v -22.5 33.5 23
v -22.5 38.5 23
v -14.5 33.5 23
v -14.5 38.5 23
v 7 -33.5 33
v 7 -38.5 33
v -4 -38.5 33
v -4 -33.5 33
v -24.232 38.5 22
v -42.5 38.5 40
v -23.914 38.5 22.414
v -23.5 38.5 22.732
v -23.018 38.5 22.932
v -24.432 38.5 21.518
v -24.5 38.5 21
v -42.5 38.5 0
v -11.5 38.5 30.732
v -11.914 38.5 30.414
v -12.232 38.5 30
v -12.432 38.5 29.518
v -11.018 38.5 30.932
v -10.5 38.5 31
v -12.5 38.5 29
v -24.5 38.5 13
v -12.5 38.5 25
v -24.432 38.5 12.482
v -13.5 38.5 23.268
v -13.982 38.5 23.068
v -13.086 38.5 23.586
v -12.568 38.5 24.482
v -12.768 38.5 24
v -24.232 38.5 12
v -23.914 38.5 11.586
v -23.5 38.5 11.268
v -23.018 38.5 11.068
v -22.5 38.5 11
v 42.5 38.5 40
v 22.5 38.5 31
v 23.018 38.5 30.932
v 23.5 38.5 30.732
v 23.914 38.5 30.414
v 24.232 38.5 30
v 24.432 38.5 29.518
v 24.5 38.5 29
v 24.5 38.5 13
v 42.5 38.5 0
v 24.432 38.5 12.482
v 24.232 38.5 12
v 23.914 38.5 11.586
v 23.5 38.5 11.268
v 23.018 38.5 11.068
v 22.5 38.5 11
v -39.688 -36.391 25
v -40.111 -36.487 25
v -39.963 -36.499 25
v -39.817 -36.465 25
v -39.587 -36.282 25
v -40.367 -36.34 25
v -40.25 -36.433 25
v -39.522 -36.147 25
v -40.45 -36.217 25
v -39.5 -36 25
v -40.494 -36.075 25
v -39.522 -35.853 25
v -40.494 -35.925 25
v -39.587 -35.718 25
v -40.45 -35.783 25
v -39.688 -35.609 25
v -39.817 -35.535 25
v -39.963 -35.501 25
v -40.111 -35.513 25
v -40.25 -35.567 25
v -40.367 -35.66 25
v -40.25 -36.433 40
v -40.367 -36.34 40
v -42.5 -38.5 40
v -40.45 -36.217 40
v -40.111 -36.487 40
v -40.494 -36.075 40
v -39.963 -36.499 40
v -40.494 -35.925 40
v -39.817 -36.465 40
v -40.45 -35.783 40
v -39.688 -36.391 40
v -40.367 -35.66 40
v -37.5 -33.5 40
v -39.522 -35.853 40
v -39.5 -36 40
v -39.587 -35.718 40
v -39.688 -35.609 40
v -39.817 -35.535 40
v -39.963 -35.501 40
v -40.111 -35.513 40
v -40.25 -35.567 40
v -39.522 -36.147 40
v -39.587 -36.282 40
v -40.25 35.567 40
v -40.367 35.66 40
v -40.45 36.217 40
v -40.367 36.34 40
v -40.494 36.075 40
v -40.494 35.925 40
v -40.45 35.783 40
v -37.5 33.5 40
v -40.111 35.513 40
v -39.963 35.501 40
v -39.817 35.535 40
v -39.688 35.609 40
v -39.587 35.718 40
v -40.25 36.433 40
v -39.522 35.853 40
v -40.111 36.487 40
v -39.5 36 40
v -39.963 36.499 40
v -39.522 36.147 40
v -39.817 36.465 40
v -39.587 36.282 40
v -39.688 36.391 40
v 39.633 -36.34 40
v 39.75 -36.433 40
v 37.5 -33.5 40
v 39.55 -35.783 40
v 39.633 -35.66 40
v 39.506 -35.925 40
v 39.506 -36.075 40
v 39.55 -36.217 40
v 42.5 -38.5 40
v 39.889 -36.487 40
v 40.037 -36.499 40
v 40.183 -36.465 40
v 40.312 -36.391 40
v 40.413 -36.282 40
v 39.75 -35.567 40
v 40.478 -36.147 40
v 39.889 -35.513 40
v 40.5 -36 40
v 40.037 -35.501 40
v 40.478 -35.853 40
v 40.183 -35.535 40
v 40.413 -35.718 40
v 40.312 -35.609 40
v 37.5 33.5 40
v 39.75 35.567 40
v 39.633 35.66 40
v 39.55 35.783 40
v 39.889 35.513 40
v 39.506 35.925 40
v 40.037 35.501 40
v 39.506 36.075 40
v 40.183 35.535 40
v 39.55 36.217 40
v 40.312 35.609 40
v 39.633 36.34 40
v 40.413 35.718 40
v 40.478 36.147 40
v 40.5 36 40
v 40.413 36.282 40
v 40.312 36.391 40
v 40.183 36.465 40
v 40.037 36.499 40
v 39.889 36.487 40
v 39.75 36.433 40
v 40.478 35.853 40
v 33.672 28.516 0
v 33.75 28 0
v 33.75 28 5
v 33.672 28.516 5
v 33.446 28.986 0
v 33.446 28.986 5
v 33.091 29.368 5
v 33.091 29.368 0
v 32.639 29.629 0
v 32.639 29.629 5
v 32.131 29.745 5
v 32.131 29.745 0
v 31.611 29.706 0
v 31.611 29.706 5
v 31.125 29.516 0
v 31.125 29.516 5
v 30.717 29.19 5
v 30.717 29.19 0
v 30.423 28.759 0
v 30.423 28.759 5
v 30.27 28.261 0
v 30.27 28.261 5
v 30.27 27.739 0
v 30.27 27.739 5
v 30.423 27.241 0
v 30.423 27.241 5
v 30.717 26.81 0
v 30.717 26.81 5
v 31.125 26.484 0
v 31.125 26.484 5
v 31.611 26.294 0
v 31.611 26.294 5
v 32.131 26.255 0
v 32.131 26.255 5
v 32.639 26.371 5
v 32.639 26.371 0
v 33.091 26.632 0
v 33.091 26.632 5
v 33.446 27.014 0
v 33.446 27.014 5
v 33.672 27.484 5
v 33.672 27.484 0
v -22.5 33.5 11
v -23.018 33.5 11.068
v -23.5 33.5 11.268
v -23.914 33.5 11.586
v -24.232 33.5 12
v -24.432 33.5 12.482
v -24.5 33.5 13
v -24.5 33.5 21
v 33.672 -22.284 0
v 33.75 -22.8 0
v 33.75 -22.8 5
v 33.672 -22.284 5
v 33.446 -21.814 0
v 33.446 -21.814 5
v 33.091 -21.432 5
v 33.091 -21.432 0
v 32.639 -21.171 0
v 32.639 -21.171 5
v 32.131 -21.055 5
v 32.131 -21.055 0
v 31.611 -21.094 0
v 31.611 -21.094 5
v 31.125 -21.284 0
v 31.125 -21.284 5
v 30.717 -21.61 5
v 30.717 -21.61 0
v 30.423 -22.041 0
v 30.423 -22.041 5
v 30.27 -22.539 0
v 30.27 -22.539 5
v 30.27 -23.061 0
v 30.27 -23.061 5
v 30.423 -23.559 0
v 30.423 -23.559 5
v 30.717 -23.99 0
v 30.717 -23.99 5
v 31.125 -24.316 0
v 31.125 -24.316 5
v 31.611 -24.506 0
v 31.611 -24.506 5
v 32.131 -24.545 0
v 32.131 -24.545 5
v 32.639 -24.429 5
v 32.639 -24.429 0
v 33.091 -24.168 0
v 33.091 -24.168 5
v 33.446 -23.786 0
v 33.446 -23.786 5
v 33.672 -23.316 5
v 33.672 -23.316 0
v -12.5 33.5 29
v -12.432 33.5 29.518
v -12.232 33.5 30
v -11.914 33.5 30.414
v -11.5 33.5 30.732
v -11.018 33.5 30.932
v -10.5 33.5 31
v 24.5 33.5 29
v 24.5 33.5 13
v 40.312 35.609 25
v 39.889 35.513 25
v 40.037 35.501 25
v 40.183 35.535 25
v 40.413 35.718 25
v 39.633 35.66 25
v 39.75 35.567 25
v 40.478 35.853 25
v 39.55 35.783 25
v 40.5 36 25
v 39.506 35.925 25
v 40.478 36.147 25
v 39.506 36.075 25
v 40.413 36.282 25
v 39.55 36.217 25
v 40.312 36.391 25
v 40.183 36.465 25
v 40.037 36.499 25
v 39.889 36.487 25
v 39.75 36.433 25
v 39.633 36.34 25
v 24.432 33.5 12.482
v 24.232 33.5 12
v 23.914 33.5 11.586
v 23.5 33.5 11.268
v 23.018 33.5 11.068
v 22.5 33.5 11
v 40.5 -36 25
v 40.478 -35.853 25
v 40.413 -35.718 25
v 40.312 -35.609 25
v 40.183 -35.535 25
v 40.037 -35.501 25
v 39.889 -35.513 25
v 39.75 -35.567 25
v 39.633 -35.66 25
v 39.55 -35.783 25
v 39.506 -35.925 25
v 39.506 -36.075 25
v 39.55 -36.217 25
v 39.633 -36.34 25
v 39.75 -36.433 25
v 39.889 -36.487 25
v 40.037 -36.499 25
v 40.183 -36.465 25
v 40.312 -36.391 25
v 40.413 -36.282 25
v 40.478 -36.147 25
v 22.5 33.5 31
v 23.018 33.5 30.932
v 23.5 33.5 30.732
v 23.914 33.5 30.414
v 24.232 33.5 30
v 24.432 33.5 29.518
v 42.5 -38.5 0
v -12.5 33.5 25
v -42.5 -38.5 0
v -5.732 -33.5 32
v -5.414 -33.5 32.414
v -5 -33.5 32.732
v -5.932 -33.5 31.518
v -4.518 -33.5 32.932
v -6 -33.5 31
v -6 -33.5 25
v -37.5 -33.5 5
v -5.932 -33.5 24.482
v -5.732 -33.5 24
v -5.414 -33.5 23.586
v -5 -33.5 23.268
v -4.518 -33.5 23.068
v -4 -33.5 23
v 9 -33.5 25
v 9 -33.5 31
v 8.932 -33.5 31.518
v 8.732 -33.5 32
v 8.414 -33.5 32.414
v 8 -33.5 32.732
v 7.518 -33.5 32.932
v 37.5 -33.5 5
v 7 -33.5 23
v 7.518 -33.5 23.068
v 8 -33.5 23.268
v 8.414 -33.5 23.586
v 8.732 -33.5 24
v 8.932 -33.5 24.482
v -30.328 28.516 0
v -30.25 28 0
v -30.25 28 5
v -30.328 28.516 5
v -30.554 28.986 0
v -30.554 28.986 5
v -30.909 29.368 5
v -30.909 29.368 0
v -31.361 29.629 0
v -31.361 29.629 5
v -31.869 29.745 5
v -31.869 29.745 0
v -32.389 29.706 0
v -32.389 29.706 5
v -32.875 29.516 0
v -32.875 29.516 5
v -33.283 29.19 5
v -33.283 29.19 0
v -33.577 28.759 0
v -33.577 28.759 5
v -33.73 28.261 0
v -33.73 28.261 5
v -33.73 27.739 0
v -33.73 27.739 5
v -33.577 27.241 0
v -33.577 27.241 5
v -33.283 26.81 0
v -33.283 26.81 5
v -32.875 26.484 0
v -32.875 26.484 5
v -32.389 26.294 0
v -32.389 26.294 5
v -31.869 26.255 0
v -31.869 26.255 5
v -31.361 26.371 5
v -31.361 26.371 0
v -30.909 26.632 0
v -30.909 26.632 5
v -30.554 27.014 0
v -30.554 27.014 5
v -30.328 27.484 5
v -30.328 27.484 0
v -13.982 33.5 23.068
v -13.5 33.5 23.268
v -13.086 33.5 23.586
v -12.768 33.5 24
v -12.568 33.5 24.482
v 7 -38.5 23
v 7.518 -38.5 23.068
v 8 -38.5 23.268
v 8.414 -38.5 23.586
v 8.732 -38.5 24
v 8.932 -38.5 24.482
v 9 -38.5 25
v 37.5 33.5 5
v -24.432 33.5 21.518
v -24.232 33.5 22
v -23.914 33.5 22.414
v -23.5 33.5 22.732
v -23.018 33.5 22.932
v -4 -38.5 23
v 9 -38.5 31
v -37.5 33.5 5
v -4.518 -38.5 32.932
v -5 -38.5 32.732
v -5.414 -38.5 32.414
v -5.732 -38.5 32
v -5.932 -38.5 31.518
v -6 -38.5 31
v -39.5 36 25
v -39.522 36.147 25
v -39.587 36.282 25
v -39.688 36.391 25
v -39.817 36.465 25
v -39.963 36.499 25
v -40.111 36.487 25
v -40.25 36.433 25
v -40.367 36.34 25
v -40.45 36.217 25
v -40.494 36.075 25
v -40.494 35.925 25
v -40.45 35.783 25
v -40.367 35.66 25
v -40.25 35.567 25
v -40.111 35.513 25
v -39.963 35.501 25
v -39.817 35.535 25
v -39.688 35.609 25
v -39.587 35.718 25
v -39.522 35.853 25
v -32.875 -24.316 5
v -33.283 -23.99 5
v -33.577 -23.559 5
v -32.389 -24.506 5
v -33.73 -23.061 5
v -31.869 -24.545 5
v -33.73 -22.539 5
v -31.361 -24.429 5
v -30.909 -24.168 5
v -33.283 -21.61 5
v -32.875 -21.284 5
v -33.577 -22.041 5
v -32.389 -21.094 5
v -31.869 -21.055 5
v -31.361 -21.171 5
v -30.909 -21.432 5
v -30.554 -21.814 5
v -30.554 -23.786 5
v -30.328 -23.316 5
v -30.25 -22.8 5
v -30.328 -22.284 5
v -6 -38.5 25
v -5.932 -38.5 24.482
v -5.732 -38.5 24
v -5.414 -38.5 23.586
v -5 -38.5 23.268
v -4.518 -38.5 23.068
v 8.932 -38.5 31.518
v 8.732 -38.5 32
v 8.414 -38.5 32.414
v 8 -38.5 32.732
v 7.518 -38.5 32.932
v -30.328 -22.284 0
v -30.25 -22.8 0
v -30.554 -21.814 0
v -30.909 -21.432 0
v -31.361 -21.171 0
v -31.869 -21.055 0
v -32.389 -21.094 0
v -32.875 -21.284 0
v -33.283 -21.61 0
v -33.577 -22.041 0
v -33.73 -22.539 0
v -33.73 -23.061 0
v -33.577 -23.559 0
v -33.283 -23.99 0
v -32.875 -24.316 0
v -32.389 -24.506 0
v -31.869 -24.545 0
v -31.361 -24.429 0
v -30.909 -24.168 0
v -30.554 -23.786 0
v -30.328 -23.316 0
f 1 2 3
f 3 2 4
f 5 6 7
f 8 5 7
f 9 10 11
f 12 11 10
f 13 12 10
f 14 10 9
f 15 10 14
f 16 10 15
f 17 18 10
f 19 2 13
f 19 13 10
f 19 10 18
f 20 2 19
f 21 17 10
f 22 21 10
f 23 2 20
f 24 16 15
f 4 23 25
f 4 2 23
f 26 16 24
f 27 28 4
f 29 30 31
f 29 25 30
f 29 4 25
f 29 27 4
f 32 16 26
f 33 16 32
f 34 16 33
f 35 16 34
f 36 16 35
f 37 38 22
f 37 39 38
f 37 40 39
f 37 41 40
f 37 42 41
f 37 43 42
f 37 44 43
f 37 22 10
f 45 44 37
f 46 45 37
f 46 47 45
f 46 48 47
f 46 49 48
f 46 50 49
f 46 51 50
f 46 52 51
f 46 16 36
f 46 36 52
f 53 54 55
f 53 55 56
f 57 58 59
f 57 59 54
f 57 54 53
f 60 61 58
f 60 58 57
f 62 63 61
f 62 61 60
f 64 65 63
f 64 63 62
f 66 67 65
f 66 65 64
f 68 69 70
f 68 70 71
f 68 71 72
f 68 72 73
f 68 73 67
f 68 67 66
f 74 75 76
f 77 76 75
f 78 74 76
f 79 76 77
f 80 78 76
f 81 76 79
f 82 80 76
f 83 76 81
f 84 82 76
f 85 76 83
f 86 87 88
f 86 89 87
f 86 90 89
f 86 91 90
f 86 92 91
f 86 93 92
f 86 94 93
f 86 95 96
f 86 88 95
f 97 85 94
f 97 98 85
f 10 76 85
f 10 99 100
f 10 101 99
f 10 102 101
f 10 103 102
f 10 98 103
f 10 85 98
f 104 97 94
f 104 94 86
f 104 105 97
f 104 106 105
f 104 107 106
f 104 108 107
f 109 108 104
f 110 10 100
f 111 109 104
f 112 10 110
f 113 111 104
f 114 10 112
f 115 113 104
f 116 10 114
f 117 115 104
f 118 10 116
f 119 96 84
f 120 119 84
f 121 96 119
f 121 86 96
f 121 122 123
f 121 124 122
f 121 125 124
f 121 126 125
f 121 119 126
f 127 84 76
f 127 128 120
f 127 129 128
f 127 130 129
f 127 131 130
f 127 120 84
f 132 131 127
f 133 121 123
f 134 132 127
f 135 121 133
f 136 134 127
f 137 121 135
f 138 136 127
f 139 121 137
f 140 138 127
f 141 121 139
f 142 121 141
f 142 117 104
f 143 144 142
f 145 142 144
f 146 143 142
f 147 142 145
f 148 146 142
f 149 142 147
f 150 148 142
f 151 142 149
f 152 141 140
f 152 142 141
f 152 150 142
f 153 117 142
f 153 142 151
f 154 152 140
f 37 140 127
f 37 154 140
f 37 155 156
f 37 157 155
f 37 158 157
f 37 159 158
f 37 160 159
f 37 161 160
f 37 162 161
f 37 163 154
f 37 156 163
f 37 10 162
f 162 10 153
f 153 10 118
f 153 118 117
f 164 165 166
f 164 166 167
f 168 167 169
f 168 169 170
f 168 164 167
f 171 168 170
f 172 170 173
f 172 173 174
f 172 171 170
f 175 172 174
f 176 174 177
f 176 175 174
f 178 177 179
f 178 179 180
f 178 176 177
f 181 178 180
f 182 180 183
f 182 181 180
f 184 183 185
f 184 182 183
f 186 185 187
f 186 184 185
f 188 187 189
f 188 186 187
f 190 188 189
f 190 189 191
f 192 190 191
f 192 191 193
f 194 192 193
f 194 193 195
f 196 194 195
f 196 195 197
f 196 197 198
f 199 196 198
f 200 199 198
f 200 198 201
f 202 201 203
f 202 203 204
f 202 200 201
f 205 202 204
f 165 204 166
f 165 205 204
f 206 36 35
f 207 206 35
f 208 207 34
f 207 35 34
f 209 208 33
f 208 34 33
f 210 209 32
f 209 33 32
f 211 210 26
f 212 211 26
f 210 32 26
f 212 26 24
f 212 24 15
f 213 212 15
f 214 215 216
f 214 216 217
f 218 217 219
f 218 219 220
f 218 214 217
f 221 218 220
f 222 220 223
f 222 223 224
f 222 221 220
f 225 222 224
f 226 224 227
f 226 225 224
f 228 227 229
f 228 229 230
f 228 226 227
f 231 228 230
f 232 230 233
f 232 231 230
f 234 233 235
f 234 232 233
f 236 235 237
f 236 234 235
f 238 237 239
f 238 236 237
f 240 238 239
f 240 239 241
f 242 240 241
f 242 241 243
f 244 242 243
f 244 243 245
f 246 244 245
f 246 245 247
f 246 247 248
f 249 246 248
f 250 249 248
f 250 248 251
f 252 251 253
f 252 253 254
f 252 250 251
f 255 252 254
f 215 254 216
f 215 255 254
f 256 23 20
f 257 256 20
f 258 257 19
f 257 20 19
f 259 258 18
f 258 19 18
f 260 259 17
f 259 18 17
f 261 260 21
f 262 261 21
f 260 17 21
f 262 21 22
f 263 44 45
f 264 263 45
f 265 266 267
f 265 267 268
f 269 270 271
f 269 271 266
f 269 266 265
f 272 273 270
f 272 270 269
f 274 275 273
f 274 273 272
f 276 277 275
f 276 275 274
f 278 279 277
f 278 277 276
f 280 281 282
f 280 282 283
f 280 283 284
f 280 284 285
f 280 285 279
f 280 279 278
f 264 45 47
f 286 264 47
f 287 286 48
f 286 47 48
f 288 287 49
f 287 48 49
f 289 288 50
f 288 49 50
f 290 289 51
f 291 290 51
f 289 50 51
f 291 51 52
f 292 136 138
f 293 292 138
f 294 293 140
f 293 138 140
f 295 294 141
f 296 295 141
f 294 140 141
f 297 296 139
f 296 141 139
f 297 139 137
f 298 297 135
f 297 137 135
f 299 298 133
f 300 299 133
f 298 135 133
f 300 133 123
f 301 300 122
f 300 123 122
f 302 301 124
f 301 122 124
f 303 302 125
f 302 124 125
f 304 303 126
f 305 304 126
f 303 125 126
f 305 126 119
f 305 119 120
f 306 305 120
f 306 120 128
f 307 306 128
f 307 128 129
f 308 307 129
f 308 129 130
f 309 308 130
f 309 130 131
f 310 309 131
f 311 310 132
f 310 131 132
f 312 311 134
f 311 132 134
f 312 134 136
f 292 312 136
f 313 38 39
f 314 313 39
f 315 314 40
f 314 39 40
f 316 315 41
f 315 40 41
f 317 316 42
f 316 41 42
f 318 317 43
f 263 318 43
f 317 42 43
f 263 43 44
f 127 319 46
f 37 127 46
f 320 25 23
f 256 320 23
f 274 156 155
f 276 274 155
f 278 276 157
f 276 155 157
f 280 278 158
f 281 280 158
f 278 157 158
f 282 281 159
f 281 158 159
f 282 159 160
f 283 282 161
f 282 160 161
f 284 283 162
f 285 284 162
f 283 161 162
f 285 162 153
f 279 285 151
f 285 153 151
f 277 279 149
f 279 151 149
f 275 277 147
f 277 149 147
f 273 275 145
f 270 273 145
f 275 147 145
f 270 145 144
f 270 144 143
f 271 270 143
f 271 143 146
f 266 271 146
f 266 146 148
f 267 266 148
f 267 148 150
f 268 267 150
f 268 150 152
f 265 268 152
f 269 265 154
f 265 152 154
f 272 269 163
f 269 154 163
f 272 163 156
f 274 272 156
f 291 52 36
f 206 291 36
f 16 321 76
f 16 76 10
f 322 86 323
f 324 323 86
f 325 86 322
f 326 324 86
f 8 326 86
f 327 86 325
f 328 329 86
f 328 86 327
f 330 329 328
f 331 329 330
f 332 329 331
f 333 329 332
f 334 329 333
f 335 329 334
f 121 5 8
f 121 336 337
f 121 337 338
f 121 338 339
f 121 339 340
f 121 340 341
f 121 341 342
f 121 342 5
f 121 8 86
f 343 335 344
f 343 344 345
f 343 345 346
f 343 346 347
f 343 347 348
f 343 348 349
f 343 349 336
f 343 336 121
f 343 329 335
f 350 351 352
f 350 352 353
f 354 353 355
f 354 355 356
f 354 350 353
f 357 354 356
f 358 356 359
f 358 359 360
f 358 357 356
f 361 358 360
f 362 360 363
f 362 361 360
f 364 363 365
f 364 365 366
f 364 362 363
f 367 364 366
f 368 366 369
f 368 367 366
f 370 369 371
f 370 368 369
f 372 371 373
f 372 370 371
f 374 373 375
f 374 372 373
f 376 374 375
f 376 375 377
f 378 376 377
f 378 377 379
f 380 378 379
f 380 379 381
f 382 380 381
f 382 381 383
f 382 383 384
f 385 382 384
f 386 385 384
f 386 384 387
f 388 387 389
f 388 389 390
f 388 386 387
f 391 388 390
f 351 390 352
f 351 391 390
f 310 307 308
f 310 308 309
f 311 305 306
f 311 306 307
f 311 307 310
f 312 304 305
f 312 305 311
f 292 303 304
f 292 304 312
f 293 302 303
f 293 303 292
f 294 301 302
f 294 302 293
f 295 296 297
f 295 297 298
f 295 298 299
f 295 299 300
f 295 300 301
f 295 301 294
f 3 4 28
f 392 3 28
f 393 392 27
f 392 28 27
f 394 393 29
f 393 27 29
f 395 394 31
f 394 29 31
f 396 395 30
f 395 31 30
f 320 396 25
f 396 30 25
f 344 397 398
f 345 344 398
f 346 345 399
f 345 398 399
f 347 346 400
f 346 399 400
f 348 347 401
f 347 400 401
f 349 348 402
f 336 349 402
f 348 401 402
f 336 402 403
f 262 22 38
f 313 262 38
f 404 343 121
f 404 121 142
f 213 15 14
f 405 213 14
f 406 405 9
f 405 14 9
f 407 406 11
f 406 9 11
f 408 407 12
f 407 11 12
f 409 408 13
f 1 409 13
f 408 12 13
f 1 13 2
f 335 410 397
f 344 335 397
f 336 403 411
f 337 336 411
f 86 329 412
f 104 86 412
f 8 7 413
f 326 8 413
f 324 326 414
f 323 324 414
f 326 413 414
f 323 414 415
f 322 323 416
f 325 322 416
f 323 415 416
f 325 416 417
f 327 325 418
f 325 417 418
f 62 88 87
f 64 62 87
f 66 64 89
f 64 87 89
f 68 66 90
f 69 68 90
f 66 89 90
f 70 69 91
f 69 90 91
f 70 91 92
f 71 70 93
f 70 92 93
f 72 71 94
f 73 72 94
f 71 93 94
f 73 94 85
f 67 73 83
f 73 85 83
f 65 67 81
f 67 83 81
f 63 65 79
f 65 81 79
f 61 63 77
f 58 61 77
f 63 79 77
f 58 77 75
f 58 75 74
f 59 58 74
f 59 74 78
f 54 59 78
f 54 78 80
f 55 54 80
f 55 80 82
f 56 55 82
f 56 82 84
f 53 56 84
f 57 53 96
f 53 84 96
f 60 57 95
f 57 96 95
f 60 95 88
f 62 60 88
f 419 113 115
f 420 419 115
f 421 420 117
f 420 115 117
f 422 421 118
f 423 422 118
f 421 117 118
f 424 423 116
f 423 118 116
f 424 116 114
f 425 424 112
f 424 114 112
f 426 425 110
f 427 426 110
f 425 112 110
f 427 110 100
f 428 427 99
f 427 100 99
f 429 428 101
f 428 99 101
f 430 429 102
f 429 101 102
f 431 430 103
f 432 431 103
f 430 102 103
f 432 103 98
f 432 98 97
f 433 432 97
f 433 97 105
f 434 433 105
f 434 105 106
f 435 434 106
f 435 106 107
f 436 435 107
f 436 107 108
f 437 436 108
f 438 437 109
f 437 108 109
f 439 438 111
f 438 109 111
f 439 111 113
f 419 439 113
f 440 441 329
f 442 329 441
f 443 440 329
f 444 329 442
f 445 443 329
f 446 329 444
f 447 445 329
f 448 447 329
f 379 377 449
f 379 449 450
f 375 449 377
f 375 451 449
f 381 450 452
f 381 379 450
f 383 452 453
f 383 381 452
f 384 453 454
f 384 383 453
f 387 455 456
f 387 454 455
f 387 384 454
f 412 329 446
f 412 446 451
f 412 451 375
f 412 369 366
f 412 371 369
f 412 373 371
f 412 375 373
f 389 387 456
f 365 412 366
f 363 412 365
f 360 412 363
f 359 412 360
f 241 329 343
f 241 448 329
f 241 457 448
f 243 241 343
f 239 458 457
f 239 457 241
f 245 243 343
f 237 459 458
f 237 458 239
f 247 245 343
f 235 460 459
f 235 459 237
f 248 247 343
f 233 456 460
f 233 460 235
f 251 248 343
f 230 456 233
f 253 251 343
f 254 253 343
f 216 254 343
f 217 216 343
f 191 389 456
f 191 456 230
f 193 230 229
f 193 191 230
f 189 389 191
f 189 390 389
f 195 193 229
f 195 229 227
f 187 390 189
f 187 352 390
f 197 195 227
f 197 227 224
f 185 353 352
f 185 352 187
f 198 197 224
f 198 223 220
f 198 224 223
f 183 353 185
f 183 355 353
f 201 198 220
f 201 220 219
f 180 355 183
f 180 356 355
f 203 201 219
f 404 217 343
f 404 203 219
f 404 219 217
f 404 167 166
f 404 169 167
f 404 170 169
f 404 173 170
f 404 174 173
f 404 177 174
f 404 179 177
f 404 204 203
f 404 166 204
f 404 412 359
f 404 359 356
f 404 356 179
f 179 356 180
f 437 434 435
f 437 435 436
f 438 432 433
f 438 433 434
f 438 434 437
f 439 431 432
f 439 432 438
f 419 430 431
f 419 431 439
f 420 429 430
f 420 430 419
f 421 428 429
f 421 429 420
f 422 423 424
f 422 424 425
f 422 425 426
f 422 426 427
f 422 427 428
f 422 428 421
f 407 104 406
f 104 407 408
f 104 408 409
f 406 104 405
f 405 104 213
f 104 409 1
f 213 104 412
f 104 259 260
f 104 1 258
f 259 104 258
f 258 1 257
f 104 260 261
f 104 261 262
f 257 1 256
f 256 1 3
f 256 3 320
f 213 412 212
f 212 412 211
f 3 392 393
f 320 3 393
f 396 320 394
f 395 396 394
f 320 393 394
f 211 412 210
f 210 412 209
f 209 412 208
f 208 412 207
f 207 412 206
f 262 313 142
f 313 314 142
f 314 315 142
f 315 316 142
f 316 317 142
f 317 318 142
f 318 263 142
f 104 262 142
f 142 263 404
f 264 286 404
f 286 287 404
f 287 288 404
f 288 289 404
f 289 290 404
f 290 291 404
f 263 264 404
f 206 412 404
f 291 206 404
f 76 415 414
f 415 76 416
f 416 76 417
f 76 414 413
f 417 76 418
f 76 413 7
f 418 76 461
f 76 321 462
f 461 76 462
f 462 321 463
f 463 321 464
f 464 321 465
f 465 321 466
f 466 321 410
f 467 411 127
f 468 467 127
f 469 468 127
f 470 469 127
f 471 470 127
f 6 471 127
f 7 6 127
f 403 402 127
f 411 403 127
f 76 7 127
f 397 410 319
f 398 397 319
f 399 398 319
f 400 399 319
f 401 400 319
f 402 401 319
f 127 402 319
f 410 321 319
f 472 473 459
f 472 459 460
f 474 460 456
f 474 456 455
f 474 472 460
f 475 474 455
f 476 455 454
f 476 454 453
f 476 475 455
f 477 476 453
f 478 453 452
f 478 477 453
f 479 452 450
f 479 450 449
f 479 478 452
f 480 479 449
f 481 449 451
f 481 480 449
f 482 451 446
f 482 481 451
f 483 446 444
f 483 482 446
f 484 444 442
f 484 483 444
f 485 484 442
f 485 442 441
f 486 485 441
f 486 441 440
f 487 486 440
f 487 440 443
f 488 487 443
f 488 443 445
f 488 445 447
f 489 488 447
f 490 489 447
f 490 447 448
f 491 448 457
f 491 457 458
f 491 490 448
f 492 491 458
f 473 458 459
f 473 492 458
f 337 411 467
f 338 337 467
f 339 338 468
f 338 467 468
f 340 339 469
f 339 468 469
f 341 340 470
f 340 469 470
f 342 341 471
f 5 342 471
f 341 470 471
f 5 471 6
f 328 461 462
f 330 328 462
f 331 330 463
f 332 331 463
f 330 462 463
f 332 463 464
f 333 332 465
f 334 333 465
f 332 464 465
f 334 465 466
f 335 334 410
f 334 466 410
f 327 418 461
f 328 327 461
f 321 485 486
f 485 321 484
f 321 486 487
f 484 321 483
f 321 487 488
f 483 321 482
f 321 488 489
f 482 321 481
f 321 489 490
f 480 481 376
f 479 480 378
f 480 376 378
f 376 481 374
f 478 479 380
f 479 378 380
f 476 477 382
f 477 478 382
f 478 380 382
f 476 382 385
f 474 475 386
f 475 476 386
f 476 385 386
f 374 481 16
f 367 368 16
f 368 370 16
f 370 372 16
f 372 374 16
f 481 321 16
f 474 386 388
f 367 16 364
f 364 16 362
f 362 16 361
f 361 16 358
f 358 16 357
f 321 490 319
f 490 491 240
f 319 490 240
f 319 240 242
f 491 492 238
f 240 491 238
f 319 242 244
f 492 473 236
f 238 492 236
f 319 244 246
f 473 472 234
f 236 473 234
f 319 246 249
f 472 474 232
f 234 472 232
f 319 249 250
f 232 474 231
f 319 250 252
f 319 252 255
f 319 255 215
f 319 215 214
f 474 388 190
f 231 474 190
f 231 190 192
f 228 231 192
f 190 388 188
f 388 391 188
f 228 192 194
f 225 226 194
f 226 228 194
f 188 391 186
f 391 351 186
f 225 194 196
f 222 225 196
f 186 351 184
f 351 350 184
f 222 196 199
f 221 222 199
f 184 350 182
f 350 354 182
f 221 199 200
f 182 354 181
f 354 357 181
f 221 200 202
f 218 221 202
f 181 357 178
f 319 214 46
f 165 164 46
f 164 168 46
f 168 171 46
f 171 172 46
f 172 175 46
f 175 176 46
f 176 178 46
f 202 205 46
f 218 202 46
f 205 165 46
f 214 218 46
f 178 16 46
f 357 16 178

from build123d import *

# Parameters (mm, degrees)
F0_W     = 75
F0_H     = 67
F0_R     = 1.75
F1_DEPTH = 5
F0_W_2   = 85
F0_H_2   = 77
F2_DEPTH = 40
F3_R     = 0.5
F4_DEPTH = 15
F6_DEPTH = 25
F8_DEPTH = 25


with BuildPart() as f1:
    # F0 (on Top) → F1 (new body)
    with BuildSketch(Plane.XY):
        Rectangle(F0_W, F0_H)
        with Locations((-32, -22.8)):
            Circle(F0_R, mode=Mode.SUBTRACT)
        with Locations((32, -22.8)):
            Circle(F0_R, mode=Mode.SUBTRACT)
        with Locations((-32, 28)):
            Circle(F0_R, mode=Mode.SUBTRACT)
        with Locations((32, 28)):
            Circle(F0_R, mode=Mode.SUBTRACT)
    extrude(amount=F1_DEPTH)

    # F0 (on Top) → F2 (join)
    with BuildSketch(Plane.XY):
        Rectangle(F0_W_2, F0_H_2)
        Rectangle(F0_W, F0_H, mode=Mode.SUBTRACT)
    extrude(amount=F2_DEPTH)

    # F3 (on face) → F4 (cut)
    with BuildSketch(Plane.XY.offset(40)):
        with Locations((-40, -36)):
            Circle(F3_R)
        with Locations((-40, 36)):
            Circle(F3_R)
        with Locations((40, -36)):
            Circle(F3_R)
        with Locations((40, 36)):
            Circle(F3_R)
    extrude(amount=-F4_DEPTH, mode=Mode.SUBTRACT)

    # F5 (on face) → F6 (cut)
    with BuildSketch(Plane.XZ.offset(38.5)):
        with BuildLine():
            Line((7, 33), (-4, 33))
            ThreePointArc((-4, 33), (-5.414214, 32.414214), (-6, 31))
            Line((-6, 31), (-6, 25))
            ThreePointArc((-6, 25), (-5.414214, 23.585786), (-4, 23))
            Line((-4, 23), (7, 23))
            ThreePointArc((7, 23), (8.414214, 23.585786), (9, 25))
            Line((9, 25), (9, 31))
            ThreePointArc((9, 31), (8.414214, 32.414214), (7, 33))
        make_face()
    extrude(amount=-F6_DEPTH, mode=Mode.SUBTRACT)

    # F7 (on face) → F8 (cut)
    with BuildSketch(Plane(origin=(0, 38.5, 0), x_dir=(-1, 0, 0), z_dir=(0, 1, 0))):
        with BuildLine():
            Line((10.5, 31), (-22.5, 31))
            ThreePointArc((-22.5, 31), (-23.914214, 30.414214), (-24.5, 29))
            Line((-24.5, 29), (-24.5, 13))
            ThreePointArc((-24.5, 13), (-23.914214, 11.585786), (-22.5, 11))
            Line((-22.5, 11), (22.5, 11))
            ThreePointArc((22.5, 11), (23.914214, 11.585786), (24.5, 13))
            Line((24.5, 13), (24.5, 21))
            ThreePointArc((24.5, 21), (23.914214, 22.414214), (22.5, 23))
            Line((22.5, 23), (14.5, 23))
            ThreePointArc((14.5, 23), (13.085786, 23.585786), (12.5, 25))
            Line((12.5, 25), (12.5, 29))
            ThreePointArc((12.5, 29), (11.914214, 30.414214), (10.5, 31))
        make_face()
    extrude(amount=-F8_DEPTH, mode=Mode.SUBTRACT)


solid = f1.part
